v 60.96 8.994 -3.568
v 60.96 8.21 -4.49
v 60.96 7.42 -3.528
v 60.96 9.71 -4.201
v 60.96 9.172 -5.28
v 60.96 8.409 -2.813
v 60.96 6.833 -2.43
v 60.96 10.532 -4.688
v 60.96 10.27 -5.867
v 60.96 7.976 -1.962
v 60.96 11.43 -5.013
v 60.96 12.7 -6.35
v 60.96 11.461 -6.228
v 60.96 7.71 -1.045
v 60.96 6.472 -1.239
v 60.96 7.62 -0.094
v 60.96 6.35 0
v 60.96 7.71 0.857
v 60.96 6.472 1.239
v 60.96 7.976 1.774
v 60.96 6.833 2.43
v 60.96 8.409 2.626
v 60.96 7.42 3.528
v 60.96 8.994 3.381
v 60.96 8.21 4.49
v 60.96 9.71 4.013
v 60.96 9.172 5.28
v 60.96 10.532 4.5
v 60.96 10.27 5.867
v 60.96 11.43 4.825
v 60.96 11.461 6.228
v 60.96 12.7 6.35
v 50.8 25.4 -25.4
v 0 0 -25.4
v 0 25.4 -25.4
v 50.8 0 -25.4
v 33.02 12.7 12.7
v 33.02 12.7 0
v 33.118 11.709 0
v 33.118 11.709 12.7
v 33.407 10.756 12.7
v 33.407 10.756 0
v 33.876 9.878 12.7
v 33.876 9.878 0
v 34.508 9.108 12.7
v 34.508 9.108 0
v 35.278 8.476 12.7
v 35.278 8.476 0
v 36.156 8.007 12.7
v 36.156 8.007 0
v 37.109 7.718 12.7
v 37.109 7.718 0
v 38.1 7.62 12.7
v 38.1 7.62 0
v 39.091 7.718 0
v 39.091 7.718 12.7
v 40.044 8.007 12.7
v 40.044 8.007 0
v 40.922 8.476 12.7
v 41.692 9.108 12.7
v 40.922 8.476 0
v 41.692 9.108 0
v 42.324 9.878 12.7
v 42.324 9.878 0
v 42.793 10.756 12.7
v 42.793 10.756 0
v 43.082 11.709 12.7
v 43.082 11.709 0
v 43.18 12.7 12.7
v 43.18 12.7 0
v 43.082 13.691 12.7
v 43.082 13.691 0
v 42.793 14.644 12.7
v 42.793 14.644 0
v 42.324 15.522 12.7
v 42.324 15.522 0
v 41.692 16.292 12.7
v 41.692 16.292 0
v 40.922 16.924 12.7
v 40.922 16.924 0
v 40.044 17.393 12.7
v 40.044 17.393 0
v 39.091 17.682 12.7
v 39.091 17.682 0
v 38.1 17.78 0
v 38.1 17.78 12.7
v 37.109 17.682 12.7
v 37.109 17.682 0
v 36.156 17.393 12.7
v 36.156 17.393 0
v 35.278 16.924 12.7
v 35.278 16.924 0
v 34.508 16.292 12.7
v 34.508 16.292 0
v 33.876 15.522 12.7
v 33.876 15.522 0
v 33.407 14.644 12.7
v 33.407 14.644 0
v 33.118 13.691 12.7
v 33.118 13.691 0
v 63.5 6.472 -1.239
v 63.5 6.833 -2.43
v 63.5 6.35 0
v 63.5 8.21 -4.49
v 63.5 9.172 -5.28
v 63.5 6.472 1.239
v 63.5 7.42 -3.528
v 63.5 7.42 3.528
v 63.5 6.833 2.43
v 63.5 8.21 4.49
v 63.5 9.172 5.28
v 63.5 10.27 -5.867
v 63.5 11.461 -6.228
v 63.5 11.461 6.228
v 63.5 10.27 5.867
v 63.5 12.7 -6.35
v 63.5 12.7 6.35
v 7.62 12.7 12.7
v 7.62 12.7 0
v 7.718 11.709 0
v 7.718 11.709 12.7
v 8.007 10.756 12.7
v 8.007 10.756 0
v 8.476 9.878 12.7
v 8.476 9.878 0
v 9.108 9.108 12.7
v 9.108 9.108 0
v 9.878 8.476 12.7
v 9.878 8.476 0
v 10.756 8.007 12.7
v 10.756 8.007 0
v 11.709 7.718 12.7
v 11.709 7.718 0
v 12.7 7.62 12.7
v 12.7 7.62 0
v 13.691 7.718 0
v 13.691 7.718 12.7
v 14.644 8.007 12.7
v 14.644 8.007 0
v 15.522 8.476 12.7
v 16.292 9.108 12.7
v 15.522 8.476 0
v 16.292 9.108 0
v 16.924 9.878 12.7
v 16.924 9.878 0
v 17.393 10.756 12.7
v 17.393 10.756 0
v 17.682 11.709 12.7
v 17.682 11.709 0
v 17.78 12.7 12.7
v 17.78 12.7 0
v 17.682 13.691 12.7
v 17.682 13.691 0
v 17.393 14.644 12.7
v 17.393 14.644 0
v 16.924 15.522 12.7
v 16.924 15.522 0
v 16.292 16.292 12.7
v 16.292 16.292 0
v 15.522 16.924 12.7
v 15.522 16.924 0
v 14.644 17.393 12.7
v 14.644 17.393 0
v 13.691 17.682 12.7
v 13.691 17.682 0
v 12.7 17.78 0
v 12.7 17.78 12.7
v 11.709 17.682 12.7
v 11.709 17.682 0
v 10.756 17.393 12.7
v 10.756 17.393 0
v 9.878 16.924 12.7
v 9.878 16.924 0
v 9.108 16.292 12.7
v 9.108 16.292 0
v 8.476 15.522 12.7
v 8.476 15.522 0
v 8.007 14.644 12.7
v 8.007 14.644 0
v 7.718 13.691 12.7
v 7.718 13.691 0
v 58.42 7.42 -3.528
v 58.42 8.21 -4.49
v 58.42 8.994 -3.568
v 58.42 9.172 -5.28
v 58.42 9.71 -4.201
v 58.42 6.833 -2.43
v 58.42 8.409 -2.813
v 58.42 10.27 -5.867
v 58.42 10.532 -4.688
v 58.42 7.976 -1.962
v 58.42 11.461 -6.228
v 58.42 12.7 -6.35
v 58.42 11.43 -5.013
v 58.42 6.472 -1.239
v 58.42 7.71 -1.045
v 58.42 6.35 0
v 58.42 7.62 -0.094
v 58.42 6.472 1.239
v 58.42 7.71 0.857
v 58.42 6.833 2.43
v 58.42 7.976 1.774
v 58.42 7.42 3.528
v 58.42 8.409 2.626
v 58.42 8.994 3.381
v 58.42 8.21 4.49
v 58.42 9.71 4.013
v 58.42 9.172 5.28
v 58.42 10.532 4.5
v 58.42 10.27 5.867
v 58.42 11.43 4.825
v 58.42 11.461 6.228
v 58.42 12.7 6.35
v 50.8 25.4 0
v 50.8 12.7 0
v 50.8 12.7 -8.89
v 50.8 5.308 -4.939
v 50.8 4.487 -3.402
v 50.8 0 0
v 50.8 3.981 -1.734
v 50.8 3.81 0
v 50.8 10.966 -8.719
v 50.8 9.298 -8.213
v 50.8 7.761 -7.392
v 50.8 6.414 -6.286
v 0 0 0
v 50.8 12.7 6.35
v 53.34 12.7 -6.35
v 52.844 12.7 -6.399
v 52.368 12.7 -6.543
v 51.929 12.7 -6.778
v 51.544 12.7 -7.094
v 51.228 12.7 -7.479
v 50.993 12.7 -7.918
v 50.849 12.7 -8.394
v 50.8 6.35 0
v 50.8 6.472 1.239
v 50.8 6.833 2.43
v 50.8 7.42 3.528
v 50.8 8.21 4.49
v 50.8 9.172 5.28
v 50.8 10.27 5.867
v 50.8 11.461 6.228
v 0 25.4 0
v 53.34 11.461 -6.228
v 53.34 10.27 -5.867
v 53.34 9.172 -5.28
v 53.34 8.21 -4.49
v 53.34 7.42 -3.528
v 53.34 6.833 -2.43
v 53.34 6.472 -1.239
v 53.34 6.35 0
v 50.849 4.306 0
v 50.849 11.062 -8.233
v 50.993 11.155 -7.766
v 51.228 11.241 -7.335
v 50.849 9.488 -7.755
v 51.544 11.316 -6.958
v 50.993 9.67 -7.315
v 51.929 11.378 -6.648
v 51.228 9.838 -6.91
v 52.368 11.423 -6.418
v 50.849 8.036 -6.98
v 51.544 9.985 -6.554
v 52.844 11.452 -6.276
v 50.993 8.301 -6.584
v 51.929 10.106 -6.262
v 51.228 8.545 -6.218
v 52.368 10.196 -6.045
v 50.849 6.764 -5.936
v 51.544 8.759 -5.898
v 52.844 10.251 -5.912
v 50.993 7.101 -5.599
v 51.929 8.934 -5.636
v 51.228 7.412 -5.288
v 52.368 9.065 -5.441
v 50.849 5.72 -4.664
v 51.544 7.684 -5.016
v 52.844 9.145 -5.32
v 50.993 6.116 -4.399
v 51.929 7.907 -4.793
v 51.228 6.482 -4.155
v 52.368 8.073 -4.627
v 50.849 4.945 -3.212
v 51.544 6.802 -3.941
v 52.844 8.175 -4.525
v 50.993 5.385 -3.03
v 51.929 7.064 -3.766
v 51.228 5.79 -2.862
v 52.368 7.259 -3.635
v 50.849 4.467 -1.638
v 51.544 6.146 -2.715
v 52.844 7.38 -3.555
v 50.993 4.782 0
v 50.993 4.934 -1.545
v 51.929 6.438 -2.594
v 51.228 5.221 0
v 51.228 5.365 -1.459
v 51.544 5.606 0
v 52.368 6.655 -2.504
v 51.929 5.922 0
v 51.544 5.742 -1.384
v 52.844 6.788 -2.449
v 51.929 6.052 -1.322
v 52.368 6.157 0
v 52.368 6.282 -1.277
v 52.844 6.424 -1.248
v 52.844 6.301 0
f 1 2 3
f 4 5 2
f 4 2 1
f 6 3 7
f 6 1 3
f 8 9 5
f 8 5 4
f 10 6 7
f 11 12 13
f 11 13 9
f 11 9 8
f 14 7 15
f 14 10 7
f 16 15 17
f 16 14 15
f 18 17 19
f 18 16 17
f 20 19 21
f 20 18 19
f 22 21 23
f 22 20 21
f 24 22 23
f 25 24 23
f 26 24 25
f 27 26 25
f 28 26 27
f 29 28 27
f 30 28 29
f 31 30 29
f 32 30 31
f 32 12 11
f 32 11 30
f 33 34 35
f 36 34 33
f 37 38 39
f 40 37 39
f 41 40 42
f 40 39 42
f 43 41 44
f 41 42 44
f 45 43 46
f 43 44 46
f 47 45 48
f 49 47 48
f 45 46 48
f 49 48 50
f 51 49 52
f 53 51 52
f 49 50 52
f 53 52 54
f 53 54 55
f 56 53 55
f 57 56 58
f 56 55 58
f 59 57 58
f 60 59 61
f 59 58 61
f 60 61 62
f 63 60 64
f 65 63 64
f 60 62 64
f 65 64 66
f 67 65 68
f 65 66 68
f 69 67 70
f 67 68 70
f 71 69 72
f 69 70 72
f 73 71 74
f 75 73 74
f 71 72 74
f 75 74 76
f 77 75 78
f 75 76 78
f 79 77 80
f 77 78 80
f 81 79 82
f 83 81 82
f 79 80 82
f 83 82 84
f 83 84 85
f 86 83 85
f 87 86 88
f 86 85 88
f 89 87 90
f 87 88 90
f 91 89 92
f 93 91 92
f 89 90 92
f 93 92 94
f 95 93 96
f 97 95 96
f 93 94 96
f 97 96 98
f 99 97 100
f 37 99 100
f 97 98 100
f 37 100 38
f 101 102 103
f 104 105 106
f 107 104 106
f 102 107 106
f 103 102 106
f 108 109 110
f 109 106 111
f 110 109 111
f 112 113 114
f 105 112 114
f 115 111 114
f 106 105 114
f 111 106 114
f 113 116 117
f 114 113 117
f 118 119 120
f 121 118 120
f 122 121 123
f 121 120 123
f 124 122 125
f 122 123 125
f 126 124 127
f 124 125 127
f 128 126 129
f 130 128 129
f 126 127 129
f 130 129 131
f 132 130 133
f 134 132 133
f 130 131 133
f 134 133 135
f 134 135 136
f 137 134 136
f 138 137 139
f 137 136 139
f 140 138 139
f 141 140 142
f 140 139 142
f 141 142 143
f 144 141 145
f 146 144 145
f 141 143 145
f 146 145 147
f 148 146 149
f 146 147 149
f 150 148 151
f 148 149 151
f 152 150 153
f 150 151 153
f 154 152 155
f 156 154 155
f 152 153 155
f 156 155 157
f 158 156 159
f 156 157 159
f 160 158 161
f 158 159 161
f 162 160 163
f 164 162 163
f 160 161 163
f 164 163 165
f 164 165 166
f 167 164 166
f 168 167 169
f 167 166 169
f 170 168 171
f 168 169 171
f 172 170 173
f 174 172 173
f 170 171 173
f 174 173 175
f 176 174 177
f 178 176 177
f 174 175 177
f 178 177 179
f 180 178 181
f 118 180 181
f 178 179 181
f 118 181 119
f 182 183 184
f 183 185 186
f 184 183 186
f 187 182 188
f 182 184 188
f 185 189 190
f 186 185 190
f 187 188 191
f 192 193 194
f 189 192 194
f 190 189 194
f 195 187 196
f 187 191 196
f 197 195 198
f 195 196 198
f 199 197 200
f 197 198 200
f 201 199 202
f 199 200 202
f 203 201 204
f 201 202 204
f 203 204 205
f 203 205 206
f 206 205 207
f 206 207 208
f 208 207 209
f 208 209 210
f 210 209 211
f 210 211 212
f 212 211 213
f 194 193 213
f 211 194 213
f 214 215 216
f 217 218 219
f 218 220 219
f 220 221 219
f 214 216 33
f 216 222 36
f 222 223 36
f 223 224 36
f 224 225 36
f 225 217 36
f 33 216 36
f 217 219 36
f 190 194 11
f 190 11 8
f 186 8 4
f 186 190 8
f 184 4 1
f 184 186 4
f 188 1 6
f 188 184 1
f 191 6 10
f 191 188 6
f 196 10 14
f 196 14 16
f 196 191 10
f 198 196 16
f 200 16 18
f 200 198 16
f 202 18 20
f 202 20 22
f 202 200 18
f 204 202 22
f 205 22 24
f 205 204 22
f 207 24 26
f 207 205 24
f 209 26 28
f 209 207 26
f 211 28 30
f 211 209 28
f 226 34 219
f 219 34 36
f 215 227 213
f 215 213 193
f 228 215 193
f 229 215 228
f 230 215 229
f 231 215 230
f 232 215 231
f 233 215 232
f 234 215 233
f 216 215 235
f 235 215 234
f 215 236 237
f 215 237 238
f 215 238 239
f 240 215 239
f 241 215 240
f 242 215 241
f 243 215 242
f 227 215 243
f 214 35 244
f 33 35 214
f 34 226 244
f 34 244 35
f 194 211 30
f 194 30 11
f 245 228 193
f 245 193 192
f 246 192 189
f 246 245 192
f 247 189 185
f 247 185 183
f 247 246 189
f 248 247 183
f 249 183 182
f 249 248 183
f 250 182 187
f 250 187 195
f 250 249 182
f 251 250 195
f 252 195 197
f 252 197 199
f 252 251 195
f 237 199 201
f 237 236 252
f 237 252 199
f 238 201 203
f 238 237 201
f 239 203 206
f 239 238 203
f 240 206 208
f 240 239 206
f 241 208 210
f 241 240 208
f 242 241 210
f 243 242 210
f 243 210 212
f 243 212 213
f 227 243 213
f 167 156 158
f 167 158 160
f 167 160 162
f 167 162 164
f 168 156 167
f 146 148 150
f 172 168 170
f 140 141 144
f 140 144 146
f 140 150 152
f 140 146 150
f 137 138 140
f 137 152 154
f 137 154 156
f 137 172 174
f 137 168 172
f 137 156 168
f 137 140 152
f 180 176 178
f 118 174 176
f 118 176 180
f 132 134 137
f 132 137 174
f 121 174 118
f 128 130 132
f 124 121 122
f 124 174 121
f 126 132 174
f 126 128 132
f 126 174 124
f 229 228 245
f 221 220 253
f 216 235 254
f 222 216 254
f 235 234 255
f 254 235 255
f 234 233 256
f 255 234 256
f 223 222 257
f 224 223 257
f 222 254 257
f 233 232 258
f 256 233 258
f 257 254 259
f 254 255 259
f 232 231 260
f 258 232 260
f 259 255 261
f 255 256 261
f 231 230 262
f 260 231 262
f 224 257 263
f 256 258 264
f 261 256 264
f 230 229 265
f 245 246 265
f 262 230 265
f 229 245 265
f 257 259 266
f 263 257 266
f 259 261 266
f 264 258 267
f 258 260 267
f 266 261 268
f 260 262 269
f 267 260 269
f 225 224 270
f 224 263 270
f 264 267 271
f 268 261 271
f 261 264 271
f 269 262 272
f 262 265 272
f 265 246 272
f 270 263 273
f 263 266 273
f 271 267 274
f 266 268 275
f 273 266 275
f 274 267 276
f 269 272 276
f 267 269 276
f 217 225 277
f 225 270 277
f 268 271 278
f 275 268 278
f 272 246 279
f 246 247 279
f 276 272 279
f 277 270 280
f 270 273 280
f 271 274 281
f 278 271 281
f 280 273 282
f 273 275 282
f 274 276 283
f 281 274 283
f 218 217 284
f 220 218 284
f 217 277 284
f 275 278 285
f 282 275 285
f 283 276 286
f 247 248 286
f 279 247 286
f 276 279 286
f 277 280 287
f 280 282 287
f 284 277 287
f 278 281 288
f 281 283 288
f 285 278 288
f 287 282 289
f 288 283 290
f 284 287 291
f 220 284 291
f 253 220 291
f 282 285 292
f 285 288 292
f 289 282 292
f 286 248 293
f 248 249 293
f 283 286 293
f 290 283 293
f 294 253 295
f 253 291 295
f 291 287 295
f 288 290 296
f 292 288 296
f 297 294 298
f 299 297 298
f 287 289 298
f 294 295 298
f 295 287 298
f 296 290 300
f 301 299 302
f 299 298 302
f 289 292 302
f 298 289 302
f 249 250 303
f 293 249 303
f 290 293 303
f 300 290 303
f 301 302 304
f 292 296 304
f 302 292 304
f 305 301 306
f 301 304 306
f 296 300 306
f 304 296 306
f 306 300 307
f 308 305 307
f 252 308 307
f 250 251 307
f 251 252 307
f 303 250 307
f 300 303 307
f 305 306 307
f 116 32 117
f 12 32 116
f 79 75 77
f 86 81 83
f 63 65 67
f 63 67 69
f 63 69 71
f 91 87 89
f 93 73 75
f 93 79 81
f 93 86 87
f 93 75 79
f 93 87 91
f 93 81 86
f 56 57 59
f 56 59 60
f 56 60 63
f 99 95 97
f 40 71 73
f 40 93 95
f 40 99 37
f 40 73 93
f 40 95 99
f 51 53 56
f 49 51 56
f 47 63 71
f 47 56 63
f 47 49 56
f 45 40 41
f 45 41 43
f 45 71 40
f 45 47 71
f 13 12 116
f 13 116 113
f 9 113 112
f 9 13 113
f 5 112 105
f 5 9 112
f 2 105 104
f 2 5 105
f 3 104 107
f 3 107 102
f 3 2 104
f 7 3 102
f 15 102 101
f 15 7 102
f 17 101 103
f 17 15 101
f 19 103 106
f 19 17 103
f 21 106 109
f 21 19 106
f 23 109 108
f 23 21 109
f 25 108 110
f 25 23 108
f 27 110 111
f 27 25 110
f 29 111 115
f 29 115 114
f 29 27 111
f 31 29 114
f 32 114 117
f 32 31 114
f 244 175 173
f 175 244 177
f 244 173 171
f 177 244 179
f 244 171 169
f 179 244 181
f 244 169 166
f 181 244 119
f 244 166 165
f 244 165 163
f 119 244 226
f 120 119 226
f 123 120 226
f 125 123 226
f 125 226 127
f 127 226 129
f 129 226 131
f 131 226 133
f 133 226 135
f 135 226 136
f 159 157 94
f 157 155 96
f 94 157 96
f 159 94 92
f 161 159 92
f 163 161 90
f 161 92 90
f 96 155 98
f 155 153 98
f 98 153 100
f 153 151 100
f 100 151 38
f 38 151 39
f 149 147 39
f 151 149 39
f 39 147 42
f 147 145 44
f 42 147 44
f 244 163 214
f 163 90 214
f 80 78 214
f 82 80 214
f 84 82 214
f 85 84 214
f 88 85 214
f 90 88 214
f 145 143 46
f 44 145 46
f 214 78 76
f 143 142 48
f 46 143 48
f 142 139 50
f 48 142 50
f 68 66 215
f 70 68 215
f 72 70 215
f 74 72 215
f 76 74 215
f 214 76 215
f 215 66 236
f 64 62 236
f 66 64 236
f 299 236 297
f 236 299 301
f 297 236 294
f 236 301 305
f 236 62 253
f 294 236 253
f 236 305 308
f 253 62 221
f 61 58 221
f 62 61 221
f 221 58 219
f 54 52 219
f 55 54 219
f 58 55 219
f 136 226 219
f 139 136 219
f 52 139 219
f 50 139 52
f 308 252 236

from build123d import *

# Parameters (mm, degrees)
SKETCH1_W           = 50.8
SKETCH1_H           = 25.4
BOSS_EXTRUDE2_DEPTH = 25.4
SKETCH3_R           = 5.08
BOSS_EXTRUDE3_DEPTH = 12.7
BOSS_EXTRUDE4_START = 50.8
BOSS_EXTRUDE4_DEPTH = 12.7
CUT_EXTRUDE1_START  = 58.42
CUT_EXTRUDE1_DEPTH  = 2.54
FILLET8_R           = 2.54


with BuildPart() as part:
    # Sketch1 → Boss-Extrude2 (new body)
    with BuildSketch(Plane(origin=(0, 0, 0), x_dir=(1, 0, 0), z_dir=(0, 1, 0))):
        with Locations((25.4, 12.7)):
            Rectangle(SKETCH1_W, SKETCH1_H)
    extrude(amount=BOSS_EXTRUDE2_DEPTH)

    # Sketch3 → Boss-Extrude3 (add)
    with BuildSketch(Plane.XY):
        with Locations(Location((12.7, 12.7, 0), (0, 0, 180))):
            Circle(SKETCH3_R)
        with Locations(Location((38.1, 12.7, 0), (0, 0, 180))):
            Circle(SKETCH3_R)
    extrude(amount=BOSS_EXTRUDE3_DEPTH)

    # Sketch4 → Boss-Extrude4 (add)
    with BuildSketch(Plane(origin=(0, 0, 0), x_dir=(0, 0, -1), z_dir=(1, 0, 0)).offset(BOSS_EXTRUDE4_START)):
        with BuildLine():
            Line((-6.35, 12.7), (6.35, 12.7))
            ThreePointArc((6.35, 12.7), (0, 6.35), (-6.35, 12.7))
        make_face()
    extrude(amount=BOSS_EXTRUDE4_DEPTH)

    # Sketch24 → Cut-Extrude1 (cut)
    with BuildSketch(Plane(origin=(0, 0, 0), x_dir=(0, 0, -1), z_dir=(1, 0, 0)).offset(CUT_EXTRUDE1_START)):
        with BuildLine():
            Line((-6.35, 12.7), (6.35, 12.7))
            ThreePointArc((6.35, 12.7), (0, 6.35), (-6.35, 12.7))
        make_face()
        with BuildLine():
            Line((-4.824854626, 11.43), (5.012523073, 11.43))
            ThreePointArc((5.012523073, 11.43), (0.093834223, 7.62), (-4.824854626, 11.43))
        make_face(mode=Mode.SUBTRACT)
    extrude(amount=CUT_EXTRUDE1_DEPTH, mode=Mode.SUBTRACT)

    # Fillet8
    fillet8_edges = [part.edges().sort_by_distance(p)[0] for p in [
        (50.8, 8.209871939, -4.490128061),
    ]]
    fillet(fillet8_edges, radius=FILLET8_R)


solid = part.part
